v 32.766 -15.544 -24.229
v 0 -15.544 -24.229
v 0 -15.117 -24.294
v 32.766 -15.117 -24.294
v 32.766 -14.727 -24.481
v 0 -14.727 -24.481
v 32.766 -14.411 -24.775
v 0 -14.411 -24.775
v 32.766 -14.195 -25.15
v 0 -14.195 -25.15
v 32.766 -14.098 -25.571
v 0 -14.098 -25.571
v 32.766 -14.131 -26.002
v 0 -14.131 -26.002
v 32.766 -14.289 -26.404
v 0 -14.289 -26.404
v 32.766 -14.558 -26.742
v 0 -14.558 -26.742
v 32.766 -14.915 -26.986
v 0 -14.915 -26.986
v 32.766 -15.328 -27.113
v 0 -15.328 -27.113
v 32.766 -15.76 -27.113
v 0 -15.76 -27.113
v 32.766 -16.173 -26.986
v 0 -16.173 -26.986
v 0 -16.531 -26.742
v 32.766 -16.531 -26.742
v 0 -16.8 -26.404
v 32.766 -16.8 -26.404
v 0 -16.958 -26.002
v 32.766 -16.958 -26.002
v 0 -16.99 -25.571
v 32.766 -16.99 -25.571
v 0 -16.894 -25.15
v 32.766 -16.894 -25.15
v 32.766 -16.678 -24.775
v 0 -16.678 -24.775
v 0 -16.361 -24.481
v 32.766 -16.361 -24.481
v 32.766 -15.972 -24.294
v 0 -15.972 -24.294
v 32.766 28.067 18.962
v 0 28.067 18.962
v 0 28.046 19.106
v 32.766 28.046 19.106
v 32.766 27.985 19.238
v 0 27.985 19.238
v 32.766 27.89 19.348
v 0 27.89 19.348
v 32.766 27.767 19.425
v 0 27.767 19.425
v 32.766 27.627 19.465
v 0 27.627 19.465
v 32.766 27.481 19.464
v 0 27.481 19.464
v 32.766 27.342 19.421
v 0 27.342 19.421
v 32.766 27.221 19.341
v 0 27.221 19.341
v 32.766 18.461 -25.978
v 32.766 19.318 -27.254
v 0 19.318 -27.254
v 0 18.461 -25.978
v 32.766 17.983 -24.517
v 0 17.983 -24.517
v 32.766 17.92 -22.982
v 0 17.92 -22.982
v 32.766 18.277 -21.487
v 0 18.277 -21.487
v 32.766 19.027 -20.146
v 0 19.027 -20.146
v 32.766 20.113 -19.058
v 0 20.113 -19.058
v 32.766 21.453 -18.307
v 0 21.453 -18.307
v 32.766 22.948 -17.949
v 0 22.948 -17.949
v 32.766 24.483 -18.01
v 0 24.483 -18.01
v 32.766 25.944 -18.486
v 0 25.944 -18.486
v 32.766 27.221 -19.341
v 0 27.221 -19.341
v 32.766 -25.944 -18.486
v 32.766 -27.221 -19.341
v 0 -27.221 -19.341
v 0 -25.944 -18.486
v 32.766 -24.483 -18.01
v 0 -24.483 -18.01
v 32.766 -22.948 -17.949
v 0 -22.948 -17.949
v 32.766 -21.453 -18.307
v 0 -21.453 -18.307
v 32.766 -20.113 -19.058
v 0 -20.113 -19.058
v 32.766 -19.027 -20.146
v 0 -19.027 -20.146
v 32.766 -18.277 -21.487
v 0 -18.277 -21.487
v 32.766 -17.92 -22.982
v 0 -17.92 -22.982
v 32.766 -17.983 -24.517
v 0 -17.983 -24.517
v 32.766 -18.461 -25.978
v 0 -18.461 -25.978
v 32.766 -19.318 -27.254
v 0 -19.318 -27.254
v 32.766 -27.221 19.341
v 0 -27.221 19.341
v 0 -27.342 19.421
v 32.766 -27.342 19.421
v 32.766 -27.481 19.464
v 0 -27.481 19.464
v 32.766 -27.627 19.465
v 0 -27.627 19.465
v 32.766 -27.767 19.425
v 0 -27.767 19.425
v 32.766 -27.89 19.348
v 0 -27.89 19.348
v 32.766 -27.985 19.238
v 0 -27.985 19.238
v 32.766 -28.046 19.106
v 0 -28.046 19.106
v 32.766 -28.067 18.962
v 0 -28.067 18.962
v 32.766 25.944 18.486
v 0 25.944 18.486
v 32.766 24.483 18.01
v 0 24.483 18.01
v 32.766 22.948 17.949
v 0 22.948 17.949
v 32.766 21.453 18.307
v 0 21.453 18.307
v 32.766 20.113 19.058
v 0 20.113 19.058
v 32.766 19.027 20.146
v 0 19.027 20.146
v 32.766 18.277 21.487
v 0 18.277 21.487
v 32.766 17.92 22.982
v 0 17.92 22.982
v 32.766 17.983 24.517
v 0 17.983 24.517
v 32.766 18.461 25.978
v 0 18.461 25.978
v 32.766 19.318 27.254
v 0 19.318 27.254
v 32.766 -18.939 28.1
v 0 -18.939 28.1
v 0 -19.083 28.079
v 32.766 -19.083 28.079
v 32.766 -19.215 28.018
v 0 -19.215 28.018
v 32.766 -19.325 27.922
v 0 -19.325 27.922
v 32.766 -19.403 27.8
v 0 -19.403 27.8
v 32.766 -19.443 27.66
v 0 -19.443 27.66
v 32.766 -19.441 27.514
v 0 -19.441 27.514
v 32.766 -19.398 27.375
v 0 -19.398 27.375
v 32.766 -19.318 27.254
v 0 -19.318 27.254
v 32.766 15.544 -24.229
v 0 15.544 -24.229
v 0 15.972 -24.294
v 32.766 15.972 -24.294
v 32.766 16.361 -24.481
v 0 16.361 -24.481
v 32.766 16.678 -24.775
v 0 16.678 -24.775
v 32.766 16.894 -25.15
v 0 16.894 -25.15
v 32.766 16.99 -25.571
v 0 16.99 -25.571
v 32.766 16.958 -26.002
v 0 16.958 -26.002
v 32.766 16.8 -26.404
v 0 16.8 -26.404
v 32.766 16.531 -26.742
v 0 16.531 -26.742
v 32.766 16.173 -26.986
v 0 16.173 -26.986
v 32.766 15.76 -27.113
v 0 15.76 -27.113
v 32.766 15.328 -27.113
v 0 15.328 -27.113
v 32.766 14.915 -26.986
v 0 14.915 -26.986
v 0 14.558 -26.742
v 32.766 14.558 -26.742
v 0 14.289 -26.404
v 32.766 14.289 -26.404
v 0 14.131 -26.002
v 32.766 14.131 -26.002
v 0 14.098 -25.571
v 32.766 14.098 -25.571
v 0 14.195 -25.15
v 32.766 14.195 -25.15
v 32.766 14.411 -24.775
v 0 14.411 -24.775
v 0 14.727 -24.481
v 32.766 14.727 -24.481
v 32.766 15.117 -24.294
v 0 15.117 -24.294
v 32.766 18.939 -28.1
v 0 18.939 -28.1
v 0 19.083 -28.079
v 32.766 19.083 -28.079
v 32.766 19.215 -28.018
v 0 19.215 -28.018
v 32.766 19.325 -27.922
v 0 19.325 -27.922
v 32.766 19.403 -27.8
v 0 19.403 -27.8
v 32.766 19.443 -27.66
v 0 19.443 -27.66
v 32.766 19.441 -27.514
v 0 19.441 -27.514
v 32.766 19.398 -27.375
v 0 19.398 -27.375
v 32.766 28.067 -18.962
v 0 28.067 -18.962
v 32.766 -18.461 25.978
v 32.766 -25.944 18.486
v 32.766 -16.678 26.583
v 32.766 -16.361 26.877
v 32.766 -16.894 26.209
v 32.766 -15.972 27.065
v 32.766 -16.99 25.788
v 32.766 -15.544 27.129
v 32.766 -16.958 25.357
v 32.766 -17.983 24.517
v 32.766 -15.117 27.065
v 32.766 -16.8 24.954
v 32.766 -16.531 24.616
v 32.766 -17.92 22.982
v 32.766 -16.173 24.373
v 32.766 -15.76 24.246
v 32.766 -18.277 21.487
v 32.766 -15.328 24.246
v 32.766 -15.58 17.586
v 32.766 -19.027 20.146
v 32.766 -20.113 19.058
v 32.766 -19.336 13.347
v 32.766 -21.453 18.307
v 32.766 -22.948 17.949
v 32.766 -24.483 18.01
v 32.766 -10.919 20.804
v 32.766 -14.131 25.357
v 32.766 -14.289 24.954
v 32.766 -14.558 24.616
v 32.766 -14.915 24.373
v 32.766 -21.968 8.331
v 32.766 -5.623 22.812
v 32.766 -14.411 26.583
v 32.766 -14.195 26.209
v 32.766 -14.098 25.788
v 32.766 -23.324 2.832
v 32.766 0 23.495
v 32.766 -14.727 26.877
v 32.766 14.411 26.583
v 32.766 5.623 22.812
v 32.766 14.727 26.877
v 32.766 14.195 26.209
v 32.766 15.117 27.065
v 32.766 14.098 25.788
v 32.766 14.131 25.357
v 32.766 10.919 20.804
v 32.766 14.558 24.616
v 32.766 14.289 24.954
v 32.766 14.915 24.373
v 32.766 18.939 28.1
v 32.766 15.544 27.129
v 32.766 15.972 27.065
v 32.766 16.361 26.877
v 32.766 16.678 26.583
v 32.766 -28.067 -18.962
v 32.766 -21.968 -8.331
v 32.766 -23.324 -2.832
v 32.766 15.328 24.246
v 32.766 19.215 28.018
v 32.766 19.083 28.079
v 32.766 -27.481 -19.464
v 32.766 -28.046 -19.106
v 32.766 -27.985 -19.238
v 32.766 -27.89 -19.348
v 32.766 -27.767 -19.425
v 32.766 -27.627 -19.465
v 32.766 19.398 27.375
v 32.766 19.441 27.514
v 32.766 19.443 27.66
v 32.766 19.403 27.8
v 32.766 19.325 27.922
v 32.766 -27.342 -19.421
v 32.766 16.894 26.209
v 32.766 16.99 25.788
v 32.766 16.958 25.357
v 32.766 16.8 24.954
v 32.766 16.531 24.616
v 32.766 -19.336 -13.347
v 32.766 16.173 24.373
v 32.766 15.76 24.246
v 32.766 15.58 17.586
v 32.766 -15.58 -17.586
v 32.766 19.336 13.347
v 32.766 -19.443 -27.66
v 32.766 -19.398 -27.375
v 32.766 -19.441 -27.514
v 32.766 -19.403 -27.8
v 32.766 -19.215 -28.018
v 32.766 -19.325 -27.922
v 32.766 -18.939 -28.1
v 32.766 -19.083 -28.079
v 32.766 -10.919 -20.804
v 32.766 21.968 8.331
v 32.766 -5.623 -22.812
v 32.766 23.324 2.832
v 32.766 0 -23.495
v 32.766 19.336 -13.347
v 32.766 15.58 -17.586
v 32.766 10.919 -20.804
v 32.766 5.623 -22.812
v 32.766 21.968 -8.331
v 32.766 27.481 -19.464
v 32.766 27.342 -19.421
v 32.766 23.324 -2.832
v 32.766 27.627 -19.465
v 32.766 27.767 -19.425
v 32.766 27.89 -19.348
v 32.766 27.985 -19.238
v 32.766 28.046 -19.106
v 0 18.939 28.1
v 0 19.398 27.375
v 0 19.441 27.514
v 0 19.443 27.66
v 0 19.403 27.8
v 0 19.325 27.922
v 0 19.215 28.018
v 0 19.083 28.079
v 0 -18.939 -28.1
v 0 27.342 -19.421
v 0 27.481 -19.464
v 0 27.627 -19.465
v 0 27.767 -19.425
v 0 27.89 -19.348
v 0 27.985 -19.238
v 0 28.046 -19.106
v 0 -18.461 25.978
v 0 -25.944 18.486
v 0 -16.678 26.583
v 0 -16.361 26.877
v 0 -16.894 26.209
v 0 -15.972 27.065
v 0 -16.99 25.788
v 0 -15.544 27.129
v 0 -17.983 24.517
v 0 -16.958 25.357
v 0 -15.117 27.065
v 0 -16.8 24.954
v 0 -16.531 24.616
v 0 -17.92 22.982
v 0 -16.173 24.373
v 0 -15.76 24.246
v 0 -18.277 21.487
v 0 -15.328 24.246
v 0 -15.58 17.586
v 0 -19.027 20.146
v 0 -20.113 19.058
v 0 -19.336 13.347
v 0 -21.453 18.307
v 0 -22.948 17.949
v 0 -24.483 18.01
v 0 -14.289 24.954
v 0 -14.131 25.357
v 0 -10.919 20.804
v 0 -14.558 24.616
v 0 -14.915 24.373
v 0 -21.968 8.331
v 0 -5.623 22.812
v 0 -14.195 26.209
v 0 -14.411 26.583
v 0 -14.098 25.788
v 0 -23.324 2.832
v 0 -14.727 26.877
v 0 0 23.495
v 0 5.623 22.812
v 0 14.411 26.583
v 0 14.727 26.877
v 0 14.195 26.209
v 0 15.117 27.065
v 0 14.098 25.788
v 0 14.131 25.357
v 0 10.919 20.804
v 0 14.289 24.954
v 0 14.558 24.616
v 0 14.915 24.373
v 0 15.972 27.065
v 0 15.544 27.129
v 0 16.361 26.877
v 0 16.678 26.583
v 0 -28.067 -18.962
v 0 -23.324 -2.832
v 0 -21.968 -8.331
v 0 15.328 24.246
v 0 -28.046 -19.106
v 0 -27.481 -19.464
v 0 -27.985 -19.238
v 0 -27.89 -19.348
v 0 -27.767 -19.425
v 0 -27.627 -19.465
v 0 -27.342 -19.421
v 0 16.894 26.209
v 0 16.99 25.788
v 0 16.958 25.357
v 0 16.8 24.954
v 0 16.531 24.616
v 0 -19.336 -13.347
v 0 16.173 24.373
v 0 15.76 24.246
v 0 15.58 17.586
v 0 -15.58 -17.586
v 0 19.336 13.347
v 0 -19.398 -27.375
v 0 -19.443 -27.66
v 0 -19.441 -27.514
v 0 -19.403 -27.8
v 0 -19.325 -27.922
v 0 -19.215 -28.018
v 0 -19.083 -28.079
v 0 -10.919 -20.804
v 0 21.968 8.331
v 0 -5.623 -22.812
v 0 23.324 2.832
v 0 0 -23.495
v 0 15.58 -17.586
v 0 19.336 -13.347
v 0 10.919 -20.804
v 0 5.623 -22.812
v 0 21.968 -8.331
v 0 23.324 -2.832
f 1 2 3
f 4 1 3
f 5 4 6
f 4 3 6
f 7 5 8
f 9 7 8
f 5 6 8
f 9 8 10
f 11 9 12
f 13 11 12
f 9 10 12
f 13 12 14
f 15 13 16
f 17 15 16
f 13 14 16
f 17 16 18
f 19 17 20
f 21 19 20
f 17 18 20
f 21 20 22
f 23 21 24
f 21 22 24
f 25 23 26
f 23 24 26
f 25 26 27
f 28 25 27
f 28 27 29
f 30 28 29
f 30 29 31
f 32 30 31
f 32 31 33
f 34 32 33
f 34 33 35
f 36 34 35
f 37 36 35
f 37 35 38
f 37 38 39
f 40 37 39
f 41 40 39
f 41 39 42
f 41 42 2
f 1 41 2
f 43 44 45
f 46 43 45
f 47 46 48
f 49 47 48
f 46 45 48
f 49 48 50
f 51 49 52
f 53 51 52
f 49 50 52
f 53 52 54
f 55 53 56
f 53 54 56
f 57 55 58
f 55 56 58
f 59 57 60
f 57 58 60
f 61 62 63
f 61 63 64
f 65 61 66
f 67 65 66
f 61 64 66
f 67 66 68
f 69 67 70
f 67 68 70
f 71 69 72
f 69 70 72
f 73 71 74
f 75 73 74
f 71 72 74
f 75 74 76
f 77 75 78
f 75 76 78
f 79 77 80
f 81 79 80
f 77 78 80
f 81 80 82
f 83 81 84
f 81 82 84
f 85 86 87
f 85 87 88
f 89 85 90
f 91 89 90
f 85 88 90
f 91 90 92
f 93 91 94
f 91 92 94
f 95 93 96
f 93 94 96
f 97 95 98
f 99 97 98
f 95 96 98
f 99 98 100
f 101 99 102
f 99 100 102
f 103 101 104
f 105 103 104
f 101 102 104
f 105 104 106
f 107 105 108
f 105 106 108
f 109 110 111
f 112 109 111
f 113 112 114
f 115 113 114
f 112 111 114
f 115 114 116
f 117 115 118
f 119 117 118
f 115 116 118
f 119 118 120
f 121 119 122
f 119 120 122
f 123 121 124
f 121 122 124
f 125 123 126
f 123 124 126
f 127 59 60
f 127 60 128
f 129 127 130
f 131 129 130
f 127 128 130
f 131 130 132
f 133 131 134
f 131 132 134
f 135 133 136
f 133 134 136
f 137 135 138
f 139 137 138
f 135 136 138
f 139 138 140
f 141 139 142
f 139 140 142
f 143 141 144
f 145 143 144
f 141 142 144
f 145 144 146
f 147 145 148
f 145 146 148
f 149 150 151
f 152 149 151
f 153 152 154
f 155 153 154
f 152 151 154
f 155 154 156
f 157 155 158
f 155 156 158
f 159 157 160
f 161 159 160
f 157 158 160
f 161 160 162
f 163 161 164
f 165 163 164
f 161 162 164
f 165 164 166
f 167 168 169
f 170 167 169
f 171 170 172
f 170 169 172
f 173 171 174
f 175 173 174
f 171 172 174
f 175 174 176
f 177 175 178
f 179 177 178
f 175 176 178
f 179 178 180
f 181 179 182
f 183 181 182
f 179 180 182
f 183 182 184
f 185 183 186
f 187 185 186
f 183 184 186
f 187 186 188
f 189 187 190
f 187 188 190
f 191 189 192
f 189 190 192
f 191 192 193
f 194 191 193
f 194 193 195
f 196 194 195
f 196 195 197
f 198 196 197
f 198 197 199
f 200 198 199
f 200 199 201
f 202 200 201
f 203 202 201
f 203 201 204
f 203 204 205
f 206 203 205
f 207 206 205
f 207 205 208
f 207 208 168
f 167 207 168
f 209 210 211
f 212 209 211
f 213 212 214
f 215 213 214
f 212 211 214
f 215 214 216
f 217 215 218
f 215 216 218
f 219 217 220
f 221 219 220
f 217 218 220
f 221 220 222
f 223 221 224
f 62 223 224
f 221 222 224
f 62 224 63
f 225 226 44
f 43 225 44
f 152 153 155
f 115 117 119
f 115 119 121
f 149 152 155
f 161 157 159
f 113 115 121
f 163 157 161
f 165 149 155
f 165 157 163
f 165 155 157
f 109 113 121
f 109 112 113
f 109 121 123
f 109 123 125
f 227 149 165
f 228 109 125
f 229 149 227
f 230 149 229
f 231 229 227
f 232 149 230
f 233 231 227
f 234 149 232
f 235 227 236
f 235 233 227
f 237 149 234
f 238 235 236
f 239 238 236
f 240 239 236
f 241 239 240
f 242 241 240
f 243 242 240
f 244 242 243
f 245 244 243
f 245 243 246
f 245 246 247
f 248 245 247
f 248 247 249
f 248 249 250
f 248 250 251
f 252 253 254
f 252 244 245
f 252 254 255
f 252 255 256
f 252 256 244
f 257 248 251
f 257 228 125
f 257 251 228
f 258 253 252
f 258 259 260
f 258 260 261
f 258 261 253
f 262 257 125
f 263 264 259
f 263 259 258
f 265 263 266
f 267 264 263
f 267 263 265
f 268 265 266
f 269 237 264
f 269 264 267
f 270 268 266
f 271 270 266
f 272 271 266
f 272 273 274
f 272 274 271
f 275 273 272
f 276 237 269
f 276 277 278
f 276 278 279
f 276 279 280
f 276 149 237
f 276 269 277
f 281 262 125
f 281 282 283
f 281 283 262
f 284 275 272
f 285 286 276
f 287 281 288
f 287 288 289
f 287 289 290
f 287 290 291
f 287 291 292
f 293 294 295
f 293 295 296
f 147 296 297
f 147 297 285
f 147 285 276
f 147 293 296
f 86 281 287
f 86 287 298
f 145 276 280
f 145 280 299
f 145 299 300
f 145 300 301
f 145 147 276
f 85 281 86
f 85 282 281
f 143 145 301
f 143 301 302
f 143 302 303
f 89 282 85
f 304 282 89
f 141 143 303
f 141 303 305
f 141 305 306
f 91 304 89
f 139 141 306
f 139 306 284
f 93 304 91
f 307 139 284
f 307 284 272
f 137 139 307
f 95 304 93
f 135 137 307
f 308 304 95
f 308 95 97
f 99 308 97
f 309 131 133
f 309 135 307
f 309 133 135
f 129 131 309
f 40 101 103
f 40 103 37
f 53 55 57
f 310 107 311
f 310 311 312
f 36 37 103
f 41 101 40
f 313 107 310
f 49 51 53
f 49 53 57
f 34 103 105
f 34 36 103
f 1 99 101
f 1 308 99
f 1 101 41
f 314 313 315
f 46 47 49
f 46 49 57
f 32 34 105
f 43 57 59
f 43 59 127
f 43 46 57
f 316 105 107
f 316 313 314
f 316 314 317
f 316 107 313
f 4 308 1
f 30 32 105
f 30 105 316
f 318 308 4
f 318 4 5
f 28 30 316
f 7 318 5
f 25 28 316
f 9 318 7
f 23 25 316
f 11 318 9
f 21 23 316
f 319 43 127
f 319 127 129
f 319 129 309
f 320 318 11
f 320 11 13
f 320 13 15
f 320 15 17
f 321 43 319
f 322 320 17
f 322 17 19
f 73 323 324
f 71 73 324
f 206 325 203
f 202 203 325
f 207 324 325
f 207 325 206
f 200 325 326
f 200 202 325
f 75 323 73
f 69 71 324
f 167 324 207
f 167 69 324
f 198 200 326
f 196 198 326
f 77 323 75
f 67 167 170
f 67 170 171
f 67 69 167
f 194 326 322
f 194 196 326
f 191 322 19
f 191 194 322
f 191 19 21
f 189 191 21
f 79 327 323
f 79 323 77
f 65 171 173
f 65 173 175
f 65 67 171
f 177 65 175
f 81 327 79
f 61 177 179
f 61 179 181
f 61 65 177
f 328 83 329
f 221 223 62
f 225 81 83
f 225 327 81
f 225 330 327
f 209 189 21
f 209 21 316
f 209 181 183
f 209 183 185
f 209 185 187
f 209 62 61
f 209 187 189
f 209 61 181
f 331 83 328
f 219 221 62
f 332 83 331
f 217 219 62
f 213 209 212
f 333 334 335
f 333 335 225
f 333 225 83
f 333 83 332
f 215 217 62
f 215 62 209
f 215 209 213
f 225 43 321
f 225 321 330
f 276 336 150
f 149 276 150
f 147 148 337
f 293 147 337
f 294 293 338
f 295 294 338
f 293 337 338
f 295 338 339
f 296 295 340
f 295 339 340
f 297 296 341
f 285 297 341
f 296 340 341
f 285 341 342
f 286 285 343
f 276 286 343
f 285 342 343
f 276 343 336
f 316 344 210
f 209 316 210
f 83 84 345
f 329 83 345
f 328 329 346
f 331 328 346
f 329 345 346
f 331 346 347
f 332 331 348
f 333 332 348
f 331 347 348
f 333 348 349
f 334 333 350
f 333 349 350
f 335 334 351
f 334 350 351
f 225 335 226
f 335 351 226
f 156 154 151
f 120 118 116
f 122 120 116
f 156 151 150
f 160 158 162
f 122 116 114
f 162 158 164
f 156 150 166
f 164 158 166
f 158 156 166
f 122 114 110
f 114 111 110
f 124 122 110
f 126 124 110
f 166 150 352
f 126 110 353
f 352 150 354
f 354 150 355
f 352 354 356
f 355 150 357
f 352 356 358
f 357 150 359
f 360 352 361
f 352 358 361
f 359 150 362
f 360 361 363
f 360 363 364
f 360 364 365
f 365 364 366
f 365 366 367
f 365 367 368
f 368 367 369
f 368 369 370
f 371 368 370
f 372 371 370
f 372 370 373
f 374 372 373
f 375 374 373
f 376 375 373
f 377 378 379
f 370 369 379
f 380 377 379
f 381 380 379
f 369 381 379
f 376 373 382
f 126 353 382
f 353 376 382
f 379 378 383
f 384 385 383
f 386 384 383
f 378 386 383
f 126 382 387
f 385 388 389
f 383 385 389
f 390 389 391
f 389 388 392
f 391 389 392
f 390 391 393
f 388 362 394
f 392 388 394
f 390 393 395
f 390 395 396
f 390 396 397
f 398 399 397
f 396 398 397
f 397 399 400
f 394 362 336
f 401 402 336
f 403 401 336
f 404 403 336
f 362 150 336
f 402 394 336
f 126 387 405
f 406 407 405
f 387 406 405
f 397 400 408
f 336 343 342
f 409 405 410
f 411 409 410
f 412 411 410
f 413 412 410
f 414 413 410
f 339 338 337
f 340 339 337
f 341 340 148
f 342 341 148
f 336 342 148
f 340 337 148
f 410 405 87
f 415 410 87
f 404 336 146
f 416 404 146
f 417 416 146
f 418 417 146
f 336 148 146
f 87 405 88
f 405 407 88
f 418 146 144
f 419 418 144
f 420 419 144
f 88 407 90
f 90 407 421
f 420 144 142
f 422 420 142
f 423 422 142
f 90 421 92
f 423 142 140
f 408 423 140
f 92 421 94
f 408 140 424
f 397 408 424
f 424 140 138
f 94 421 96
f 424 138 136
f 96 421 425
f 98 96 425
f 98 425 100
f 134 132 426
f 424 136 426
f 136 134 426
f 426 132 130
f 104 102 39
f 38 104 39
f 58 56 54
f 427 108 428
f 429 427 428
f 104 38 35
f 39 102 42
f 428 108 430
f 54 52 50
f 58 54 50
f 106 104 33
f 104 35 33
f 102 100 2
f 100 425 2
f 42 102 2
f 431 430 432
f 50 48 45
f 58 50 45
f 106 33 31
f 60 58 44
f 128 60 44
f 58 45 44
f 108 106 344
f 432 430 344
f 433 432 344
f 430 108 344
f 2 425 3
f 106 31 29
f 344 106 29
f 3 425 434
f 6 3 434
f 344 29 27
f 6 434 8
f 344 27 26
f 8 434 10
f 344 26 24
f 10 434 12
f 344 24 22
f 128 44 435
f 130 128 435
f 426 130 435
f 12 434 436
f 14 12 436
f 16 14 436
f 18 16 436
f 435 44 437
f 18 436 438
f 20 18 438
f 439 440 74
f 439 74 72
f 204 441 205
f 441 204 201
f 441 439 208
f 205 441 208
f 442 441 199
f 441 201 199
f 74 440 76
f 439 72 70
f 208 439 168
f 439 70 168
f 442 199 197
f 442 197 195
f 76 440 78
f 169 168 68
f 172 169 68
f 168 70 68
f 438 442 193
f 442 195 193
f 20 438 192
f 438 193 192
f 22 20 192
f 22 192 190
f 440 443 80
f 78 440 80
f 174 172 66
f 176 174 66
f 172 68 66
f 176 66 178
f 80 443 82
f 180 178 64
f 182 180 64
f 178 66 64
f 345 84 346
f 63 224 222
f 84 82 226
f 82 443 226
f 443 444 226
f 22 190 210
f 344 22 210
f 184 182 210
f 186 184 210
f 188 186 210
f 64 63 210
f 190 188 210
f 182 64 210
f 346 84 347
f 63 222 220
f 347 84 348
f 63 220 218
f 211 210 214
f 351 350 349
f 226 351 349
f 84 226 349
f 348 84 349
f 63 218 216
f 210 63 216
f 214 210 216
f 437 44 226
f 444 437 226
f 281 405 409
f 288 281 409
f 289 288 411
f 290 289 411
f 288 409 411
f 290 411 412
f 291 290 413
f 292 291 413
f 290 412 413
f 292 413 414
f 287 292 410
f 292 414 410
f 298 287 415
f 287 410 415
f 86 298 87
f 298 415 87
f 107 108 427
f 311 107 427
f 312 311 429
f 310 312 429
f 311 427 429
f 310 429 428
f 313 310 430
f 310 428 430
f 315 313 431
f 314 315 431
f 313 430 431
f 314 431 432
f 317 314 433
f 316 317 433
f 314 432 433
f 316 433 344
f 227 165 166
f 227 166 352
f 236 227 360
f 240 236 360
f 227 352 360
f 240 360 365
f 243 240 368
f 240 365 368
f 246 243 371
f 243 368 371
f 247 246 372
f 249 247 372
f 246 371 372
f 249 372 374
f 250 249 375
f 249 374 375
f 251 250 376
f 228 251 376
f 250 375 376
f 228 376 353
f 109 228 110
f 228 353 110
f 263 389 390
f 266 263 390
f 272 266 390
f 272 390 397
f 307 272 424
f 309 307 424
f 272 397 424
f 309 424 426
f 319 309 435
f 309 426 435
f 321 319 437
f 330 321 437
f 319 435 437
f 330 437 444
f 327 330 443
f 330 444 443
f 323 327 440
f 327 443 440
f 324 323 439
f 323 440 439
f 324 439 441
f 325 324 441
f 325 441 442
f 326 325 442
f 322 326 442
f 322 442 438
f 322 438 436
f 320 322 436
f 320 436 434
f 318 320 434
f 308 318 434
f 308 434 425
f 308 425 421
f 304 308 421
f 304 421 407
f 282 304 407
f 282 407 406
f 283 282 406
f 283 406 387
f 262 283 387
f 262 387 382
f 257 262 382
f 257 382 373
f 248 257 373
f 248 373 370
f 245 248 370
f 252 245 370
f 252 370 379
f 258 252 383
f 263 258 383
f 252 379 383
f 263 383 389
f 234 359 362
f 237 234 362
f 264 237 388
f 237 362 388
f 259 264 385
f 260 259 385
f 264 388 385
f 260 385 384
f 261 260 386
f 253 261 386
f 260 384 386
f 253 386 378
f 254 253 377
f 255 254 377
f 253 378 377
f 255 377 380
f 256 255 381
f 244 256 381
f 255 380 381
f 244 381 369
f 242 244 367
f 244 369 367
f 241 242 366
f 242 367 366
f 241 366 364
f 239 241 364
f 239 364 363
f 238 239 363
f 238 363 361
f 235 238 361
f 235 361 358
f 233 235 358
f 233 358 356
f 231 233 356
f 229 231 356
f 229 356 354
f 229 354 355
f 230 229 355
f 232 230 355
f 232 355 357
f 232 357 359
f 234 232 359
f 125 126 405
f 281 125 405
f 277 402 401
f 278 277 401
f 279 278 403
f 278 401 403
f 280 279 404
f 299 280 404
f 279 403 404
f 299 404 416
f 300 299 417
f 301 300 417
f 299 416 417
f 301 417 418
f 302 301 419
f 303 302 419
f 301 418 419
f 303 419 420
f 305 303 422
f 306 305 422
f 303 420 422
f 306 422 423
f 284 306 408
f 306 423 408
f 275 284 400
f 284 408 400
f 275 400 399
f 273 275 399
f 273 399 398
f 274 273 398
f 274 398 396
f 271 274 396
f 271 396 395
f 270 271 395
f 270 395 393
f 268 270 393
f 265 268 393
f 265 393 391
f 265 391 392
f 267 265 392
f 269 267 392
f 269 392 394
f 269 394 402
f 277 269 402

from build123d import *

# Parameters (mm, degrees)
BOSS_EXTRUDE1_DEPTH     = 32.766
SKETCH2_R               = 23.495
CUT_EXTRUDE1_DEPTH      = 52.487641673
M3_5X0_6_TAPPED_HOLE1_D = 2.9


with BuildPart() as part:
    # Sketch1 → Boss-Extrude1 (new body)
    with BuildSketch(Plane(origin=(0, 0, 0), x_dir=(0, 0, -1), z_dir=(1, 0, 0))):
        with BuildLine():
            Line((28.1, -18.939080971), (28.1, 18.939080971))
            ThreePointArc((28.1, 18.939080971), (27.799547486, 19.402749), (27.25359039, 19.317951577))
            ThreePointArc((27.25359039, 19.317951577), (19.564667335, 19.532372578), (19.341179036, 27.221037422))
            ThreePointArc((19.341179036, 27.221037422), (19.425455181, 27.766820849), (18.961909612, 28.067))
            Line((18.961909612, 28.067), (-18.961909612, 28.067))
            ThreePointArc((-18.961909612, 28.067), (-19.425455181, 27.766820849), (-19.341179036, 27.221037422))
            ThreePointArc((-19.341179036, 27.221037422), (-19.564667335, 19.532372578), (-27.25359039, 19.317951577))
            ThreePointArc((-27.25359039, 19.317951577), (-27.799547486, 19.402749), (-28.1, 18.939080971))
            Line((-28.1, 18.939080971), (-28.1, -18.939080971))
            ThreePointArc((-28.1, -18.939080971), (-27.799547486, -19.402749), (-27.25359039, -19.317951577))
            ThreePointArc((-27.25359039, -19.317951577), (-19.564667335, -19.532372578), (-19.341179036, -27.221037422))
            ThreePointArc((-19.341179036, -27.221037422), (-19.425455181, -27.766820849), (-18.961909612, -28.067))
            Line((-18.961909612, -28.067), (18.961909612, -28.067))
            ThreePointArc((18.961909612, -28.067), (19.425455181, -27.766820849), (19.341179036, -27.221037422))
            ThreePointArc((19.341179036, -27.221037422), (19.564667335, -19.532372578), (27.25359039, -19.317951577))
            ThreePointArc((27.25359039, -19.317951577), (27.799547486, -19.402749), (28.1, -18.939080971))
        make_face()
    extrude(amount=BOSS_EXTRUDE1_DEPTH)

    # Sketch2 → Cut-Extrude1 (cut, through all)
    with BuildSketch(Plane.ZY):
        Circle(SKETCH2_R)
    extrude(amount=-CUT_EXTRUDE1_DEPTH, mode=Mode.SUBTRACT)

    # M3.5x0.6 Tapped Hole1 (through all)
    with Locations(Plane(origin=(32.766, 0, 0), x_dir=(0, 0, -1), z_dir=(1, 0, 0))):
        with Locations((25.6794, 15.544299782), (25.6794, -15.544299782), (-25.6794, 15.544299782), (-25.6794, -15.544299782)):
            Hole(M3_5X0_6_TAPPED_HOLE1_D / 2)


solid = part.part
